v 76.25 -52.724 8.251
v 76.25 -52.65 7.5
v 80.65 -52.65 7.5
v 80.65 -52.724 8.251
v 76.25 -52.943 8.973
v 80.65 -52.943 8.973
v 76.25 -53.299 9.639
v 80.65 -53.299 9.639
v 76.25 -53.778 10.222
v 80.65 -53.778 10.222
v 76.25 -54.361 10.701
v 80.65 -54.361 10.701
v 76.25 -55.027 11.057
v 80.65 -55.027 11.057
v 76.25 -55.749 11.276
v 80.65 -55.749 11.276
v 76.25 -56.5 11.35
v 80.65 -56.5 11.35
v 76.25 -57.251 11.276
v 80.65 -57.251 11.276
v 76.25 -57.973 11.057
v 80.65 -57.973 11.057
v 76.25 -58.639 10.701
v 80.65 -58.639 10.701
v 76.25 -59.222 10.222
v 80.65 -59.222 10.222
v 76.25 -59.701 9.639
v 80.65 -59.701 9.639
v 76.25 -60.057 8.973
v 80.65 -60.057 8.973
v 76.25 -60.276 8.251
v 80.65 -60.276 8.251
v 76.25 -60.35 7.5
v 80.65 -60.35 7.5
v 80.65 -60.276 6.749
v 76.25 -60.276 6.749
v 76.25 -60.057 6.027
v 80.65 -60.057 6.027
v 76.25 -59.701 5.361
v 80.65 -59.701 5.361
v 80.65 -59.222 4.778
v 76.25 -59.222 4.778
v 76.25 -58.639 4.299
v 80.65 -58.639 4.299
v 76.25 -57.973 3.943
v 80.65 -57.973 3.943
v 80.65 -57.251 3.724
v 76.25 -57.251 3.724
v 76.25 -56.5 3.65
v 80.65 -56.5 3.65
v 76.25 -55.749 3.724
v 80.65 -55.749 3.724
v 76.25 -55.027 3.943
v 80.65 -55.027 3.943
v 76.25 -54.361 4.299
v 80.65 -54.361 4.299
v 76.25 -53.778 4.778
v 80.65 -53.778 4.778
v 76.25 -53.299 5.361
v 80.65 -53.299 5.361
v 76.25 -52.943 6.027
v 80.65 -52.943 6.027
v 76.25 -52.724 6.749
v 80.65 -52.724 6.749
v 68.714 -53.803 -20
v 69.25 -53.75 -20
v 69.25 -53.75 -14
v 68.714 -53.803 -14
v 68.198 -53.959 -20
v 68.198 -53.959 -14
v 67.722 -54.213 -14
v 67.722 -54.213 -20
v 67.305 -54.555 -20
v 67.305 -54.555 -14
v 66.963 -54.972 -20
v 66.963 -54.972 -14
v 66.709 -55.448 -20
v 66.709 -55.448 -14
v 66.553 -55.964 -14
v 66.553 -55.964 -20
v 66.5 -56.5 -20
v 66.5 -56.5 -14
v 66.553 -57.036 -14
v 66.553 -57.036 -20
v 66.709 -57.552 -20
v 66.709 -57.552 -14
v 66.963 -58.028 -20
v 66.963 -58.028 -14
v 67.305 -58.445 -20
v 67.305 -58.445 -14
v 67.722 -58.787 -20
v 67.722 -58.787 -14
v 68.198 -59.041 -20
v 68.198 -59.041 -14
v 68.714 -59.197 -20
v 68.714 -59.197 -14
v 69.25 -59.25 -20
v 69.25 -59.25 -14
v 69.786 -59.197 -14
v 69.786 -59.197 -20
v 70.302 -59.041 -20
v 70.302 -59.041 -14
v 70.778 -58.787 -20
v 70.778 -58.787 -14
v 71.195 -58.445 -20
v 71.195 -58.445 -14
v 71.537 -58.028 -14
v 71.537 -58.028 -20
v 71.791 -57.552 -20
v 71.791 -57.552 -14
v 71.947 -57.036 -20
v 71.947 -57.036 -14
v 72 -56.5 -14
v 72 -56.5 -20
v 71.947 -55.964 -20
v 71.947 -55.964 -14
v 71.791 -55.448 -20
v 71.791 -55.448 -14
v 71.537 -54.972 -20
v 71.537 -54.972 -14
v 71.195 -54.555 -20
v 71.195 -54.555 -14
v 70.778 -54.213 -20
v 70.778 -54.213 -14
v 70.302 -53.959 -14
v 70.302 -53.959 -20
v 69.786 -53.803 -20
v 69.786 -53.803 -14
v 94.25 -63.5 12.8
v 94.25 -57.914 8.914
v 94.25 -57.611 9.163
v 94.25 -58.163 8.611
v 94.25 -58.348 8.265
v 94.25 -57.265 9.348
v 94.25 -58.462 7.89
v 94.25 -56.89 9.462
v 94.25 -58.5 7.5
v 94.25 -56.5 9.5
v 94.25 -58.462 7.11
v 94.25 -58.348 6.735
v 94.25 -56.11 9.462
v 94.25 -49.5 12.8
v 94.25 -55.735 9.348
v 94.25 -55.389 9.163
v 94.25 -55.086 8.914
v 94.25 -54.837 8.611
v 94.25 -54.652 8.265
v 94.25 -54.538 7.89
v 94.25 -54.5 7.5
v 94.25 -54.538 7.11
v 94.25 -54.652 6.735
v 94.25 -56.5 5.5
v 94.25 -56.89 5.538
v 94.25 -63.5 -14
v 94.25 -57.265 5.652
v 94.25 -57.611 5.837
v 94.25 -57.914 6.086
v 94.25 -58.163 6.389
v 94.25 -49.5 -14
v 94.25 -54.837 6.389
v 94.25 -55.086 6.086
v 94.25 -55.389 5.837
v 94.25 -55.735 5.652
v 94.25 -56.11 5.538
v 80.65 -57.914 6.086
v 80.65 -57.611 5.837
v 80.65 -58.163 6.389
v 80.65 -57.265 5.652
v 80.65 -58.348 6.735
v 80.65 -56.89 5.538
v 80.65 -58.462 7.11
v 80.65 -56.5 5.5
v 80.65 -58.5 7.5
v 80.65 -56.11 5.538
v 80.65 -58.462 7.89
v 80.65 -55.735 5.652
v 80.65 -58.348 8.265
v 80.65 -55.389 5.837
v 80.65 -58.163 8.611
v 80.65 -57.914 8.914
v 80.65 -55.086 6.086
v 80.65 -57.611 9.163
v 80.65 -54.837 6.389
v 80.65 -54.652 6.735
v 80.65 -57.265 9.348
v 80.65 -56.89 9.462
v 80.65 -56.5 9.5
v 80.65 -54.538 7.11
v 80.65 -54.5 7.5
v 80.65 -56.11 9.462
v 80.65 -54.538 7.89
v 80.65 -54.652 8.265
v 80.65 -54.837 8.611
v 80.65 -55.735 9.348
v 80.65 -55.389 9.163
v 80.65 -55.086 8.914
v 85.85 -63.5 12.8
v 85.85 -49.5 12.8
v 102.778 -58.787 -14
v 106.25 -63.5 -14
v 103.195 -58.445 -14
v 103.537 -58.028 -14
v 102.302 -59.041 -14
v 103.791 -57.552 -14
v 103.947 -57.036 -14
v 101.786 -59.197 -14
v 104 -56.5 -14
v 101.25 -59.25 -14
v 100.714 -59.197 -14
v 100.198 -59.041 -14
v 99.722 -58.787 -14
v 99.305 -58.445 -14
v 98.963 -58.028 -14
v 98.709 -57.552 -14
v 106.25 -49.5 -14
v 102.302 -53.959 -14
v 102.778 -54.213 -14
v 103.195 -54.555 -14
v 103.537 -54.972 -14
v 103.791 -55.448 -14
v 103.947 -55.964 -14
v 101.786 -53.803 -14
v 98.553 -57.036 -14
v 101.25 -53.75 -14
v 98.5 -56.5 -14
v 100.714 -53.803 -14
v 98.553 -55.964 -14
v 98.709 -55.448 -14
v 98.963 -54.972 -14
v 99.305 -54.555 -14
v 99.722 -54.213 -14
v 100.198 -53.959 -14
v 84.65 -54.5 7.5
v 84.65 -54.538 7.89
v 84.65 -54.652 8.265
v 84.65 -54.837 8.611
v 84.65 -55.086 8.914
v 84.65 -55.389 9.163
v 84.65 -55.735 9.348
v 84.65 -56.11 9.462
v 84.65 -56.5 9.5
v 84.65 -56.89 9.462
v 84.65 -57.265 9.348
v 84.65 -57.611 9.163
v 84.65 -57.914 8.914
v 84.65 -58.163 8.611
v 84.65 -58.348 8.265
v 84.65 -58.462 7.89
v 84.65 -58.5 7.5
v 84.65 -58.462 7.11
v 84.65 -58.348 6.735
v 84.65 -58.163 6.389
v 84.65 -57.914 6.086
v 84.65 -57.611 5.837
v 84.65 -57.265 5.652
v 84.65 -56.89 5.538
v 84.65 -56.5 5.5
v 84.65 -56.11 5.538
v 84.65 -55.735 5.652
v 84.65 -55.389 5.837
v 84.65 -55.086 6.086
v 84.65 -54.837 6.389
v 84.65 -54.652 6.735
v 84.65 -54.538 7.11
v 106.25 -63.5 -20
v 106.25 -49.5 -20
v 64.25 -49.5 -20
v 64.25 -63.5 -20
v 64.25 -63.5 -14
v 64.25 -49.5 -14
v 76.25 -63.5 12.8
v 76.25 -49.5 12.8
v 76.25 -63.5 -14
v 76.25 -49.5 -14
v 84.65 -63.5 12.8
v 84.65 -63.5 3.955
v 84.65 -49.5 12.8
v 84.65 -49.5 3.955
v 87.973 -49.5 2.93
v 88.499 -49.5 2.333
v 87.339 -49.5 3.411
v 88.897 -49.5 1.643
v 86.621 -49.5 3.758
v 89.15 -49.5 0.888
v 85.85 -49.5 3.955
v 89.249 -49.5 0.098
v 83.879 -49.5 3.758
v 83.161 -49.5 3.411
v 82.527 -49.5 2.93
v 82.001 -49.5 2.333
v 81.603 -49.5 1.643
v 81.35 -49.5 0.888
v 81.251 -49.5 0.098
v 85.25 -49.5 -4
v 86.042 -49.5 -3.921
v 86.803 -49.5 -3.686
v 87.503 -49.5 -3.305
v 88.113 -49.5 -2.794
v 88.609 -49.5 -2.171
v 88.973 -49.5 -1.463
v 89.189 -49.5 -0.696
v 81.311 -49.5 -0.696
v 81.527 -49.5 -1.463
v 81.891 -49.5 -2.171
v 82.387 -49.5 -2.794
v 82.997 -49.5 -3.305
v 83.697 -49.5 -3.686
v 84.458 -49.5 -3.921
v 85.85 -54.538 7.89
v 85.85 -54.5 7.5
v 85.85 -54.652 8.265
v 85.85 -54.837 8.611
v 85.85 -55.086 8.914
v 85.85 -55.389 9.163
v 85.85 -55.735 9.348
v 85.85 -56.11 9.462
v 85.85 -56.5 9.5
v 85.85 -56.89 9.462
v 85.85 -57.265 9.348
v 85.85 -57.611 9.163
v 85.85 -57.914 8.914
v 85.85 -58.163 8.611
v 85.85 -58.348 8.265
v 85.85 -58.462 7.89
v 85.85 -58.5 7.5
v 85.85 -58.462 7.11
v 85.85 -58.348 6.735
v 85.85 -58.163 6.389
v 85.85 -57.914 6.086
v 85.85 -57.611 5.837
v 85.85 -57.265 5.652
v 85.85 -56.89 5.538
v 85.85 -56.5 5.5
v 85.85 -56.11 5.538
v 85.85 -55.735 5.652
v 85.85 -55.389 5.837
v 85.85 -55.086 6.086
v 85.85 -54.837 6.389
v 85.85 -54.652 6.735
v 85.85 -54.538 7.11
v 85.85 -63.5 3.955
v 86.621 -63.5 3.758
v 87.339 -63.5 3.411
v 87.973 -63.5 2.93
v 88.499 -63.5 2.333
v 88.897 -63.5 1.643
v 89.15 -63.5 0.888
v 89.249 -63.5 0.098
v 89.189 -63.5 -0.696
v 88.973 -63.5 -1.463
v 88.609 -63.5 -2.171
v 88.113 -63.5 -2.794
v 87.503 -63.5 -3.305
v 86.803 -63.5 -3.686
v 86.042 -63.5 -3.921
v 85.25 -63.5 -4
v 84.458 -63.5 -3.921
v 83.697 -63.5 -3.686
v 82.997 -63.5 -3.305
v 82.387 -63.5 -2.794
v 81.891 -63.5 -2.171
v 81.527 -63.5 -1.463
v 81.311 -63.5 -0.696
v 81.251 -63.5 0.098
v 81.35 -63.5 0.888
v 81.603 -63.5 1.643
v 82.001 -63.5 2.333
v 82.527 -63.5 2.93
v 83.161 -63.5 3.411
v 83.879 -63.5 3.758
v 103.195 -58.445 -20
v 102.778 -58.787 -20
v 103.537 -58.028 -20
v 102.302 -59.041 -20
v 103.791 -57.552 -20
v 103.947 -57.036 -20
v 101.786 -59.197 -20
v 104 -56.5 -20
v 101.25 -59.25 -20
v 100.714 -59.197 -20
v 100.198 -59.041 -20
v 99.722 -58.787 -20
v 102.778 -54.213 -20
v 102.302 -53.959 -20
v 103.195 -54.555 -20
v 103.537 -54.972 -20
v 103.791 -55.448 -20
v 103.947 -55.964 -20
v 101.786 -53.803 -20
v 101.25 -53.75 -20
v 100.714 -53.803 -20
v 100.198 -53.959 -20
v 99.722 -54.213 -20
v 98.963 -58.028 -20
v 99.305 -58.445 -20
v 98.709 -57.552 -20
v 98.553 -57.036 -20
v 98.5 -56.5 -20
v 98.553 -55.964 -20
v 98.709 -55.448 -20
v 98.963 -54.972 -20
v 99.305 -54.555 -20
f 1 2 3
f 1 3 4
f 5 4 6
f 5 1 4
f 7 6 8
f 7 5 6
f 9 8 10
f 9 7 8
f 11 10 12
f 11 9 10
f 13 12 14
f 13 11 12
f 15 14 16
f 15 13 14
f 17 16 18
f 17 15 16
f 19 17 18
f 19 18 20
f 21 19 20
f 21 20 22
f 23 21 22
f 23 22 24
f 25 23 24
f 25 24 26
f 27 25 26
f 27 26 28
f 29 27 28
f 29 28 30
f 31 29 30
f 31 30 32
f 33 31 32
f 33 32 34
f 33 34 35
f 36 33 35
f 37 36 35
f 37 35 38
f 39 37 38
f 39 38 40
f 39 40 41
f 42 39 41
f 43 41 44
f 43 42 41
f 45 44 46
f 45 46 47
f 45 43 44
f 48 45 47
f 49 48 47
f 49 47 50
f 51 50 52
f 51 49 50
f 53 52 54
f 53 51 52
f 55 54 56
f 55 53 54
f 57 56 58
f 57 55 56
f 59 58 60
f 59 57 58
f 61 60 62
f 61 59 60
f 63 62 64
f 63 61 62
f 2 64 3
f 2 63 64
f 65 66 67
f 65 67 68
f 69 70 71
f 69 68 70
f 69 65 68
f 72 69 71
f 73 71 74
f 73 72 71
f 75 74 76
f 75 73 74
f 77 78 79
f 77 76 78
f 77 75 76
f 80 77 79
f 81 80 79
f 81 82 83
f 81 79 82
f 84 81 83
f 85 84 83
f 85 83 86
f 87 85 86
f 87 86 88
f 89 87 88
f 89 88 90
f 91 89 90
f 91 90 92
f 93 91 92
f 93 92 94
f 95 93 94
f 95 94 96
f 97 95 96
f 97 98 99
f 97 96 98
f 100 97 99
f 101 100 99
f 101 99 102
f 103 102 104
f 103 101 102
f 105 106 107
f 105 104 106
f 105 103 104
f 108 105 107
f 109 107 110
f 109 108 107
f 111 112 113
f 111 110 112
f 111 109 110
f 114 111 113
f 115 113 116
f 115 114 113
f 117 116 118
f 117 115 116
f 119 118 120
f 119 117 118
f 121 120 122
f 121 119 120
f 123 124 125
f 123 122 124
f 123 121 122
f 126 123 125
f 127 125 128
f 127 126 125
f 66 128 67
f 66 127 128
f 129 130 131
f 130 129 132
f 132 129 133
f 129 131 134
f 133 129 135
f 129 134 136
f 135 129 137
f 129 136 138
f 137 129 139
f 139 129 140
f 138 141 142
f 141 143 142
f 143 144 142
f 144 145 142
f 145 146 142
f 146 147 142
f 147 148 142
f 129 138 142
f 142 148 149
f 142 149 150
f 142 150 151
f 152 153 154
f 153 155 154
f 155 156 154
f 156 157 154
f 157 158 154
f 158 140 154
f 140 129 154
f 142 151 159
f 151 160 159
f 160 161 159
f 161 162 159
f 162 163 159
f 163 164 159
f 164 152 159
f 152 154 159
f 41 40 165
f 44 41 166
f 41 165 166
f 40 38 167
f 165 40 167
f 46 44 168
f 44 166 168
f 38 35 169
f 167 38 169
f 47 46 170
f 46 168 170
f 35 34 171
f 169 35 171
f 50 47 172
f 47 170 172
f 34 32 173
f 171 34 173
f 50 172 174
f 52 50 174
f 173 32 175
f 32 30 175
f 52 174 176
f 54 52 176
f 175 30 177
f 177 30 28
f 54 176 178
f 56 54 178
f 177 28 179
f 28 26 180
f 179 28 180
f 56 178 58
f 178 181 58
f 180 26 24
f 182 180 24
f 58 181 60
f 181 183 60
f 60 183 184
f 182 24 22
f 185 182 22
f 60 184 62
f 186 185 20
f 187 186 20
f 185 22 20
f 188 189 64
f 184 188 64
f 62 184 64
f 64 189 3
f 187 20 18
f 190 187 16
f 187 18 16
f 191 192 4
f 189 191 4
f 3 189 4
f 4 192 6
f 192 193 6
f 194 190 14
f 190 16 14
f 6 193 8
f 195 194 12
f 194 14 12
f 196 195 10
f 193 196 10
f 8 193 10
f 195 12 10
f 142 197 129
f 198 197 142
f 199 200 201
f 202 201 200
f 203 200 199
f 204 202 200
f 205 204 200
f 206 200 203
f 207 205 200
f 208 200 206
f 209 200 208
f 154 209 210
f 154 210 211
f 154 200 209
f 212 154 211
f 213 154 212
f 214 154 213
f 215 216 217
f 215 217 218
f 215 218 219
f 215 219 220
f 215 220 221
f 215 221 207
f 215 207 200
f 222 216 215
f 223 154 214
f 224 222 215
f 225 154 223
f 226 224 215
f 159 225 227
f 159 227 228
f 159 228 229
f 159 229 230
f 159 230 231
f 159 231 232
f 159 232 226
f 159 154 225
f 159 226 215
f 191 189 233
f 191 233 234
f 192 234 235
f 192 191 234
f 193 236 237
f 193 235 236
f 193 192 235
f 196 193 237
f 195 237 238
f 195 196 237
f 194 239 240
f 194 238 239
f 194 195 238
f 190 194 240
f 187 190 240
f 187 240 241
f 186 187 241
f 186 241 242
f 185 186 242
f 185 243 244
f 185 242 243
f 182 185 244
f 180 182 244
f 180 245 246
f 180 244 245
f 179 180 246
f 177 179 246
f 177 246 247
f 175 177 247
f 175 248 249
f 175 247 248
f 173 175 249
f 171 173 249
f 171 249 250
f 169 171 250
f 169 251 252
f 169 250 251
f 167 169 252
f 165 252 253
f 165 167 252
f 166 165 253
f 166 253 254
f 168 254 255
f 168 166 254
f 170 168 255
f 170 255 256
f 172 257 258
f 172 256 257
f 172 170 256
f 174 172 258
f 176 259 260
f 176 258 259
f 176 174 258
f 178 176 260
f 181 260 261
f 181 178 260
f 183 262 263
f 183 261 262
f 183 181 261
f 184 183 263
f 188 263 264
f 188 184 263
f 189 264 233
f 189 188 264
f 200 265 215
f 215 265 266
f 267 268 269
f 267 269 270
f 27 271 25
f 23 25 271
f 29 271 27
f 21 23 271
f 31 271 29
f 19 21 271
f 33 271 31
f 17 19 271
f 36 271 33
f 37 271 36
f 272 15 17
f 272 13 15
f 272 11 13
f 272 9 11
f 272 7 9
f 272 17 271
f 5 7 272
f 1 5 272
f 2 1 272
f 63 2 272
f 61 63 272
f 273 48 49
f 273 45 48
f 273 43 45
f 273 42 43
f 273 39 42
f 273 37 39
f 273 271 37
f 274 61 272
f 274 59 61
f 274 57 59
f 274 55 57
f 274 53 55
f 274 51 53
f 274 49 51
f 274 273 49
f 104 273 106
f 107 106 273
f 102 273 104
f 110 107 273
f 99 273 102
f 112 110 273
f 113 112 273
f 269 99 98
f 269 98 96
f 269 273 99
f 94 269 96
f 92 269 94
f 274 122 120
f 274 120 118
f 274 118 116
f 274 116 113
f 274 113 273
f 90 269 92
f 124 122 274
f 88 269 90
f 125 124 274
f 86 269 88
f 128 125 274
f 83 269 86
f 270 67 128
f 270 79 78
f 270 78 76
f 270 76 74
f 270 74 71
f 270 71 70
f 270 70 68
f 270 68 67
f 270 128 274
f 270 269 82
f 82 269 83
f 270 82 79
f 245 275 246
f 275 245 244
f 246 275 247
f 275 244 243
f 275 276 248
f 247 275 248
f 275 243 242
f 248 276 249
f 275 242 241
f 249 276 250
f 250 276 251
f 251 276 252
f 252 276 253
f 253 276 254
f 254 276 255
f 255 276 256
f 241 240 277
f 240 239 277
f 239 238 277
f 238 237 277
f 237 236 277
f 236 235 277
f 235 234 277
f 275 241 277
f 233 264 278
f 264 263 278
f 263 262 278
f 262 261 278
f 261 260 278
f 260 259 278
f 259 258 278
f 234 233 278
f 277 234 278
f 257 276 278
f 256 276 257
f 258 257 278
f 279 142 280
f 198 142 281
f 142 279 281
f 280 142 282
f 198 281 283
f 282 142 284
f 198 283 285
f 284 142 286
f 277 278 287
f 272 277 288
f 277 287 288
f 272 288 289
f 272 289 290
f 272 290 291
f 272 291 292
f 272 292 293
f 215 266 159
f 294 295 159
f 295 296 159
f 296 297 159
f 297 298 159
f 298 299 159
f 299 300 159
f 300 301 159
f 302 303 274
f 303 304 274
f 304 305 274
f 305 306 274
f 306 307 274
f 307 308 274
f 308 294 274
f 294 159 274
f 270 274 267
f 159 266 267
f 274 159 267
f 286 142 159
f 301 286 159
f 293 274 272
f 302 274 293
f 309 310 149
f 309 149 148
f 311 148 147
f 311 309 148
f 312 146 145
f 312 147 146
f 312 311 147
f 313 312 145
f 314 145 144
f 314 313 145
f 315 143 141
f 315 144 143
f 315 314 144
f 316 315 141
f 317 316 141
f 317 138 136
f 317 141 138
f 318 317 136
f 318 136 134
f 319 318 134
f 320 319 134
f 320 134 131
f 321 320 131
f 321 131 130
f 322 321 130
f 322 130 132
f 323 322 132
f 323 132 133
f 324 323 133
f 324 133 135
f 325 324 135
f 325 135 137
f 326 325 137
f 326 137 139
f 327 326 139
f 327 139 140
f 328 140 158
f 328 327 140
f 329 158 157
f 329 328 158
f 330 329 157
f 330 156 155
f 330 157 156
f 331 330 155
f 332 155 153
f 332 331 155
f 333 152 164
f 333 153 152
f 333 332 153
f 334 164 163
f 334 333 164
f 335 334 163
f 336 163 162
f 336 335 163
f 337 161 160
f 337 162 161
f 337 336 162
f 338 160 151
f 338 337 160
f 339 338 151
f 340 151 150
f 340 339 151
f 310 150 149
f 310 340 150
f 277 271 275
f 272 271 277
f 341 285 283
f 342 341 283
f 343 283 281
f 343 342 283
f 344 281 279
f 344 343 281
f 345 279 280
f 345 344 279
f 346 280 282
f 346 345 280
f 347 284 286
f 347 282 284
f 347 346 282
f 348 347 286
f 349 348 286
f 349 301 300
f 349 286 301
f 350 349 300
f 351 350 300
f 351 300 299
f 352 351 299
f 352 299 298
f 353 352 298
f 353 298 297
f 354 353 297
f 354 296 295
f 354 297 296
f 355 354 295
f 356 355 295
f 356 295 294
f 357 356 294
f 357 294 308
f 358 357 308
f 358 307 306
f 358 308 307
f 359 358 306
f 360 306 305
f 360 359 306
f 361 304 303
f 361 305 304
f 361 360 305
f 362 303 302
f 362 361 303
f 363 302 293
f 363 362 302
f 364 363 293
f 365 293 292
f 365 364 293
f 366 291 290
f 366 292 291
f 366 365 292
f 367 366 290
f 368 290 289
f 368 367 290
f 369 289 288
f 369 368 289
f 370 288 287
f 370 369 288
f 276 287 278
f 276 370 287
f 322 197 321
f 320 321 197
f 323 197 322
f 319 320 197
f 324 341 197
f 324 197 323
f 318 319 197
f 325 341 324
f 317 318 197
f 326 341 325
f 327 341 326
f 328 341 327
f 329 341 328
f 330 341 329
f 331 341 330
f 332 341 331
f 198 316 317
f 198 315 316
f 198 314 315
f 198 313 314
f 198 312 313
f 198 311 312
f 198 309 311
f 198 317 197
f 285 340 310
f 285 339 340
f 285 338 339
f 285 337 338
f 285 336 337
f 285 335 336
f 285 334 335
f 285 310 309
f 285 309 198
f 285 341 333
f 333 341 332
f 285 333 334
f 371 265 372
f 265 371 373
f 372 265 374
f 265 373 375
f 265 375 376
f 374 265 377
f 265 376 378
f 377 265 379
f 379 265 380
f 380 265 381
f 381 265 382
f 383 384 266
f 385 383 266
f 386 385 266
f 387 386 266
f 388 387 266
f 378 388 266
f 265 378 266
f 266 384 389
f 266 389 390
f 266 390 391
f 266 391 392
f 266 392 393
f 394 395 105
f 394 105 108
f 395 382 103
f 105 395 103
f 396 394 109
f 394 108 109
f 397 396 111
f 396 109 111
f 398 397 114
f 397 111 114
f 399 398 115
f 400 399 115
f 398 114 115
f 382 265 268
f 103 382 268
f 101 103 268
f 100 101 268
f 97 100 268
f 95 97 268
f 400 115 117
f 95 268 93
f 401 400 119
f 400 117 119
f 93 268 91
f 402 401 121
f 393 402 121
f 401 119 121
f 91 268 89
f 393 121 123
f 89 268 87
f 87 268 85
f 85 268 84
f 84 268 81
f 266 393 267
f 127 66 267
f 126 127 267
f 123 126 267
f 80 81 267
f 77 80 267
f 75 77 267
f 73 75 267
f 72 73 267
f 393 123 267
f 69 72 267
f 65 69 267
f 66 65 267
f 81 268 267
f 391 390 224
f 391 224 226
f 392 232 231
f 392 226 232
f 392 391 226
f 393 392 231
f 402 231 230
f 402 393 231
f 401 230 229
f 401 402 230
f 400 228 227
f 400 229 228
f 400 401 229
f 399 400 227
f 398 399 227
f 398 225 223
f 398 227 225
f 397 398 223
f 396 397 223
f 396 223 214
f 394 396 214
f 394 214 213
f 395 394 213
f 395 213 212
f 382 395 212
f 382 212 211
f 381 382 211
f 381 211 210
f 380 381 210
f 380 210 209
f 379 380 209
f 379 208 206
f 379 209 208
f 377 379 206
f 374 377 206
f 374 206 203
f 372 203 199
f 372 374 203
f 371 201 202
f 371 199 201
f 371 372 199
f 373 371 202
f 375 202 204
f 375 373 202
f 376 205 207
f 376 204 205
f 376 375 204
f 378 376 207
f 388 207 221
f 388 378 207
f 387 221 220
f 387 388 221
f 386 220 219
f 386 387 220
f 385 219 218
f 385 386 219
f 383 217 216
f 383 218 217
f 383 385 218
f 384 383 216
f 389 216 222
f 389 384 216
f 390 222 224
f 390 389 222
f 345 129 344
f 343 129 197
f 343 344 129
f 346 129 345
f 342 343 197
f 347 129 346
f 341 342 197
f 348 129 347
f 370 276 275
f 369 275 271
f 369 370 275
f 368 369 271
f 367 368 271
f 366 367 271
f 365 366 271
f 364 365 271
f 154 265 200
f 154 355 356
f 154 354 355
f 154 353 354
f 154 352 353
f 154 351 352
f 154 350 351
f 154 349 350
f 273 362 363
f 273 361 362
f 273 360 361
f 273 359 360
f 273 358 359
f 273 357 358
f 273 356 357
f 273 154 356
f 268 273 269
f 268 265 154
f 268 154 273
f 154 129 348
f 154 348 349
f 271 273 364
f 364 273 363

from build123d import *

# Parameters (mm, degrees)
MBOLT_SH_L_R                     = 2.75
MBOLT_SH_L_DEPTH                 = 8
MBOLT_SH_R_R                     = 2.75
MBOLT_SH_R_DEPTH                 = 8
MBOLTS_SH_PLACEMENT_ANGLE        = 90
TBOLT_SHAFT_R                    = 2
TBOLT_SHAFT_DEPTH                = 20
TBOLT_SHAFT_ROLL_ANGLE           = 90
UP_SEP_W                         = 16
UP_SEP_H                         = 1.2
UP_SEP_DEPTH                     = 13.8
SHAFT_HOLE_R                     = 4
SHAFT_HOLE_DEPTH                 = 16
SHAFT_HOLE_PITCH_ANGLE           = 90
TBOLT_HEAD_R                     = 3.85
TBOLT_HEAD_DEPTH                 = 5.4
TBOLT_HEAD_ROLL_ANGLE            = 90
SIDE_BOX_L_W                     = 14
SIDE_BOX_L_H                     = 12
SIDE_BOX_L_DEPTH                 = 26.8
SIDE_BOX_R_W                     = 14
SIDE_BOX_R_H                     = 12
SIDE_BOX_R_DEPTH                 = 26.8
TOTAL_BOX_W                      = 14
TOTAL_BOX_H                      = 42
TOTAL_BOX_DEPTH                  = 32.8
SK_SHAPE_W_HOLES_PLACEMENT_ANGLE = 90


with BuildPart() as mbolt_sh_l:
    # mbolt_sh_l → mbolt_sh_l (new body)
    with BuildSketch(Plane(origin=(7, -16, -1), x_dir=(1, 0, 0), z_dir=(0, 0, 1))):
        Circle(MBOLT_SH_L_R)
    extrude(amount=MBOLT_SH_L_DEPTH)


with BuildPart() as mbolts_sh:
    # mbolt_sh_r → mbolt_sh_r (new body)
    with BuildSketch(Plane(origin=(7, 16, -1), x_dir=(1, 0, 0), z_dir=(0, 0, 1))):
        Circle(MBOLT_SH_R_R)
    extrude(amount=MBOLT_SH_R_DEPTH)

    # mbolts_sh: union mbolt_sh_l
    add(mbolt_sh_l.part)


with BuildPart() as mbolts_sh_1:
    # mbolts_sh placement: moved
    add(mbolts_sh.part.moved(Location((0, -7, 0))).rotate(Axis((0, -7, 0), (0, 0, 1)), MBOLTS_SH_PLACEMENT_ANGLE))


with BuildPart() as tbolt_shaft:
    # tbolt_shaft → tbolt_shaft (new body)
    with BuildSketch(Plane.XY):
        Circle(TBOLT_SHAFT_R)
    extrude(amount=TBOLT_SHAFT_DEPTH)


with BuildPart() as tbolt_shaft_1:
    # tbolt_shaft roll: moved
    add(tbolt_shaft.part.rotate(Axis((0, 0, 0), (1, 0, 0)), TBOLT_SHAFT_ROLL_ANGLE))


with BuildPart() as tbolt_shaft_2:
    # tbolt_shaft placement: moved
    add(tbolt_shaft_1.part.moved(Location((7, 10, 27.5))))


with BuildPart() as up_sep:
    # up_sep → up_sep (new body)
    with BuildSketch(Plane(origin=(-1, -0.6, 21), x_dir=(1, 0, 0), z_dir=(0, 0, 1))):
        with Locations((8, 0.6)):
            Rectangle(UP_SEP_W, UP_SEP_H)
    extrude(amount=UP_SEP_DEPTH)


with BuildPart() as shaft_hole:
    # shaft_hole → shaft_hole (new body)
    with BuildSketch(Plane.XY):
        Circle(SHAFT_HOLE_R)
    extrude(amount=SHAFT_HOLE_DEPTH)


with BuildPart() as shaft_hole_1:
    # shaft_hole pitch: moved
    add(shaft_hole.part.rotate(Axis((0, 0, 0), (0, 1, 0)), SHAFT_HOLE_PITCH_ANGLE))


with BuildPart() as shaft_hole_2:
    # shaft_hole placement: moved
    add(shaft_hole_1.part.moved(Location((-1, 0, 20))))


with BuildPart() as fuse_shaft_holes:
    # tbolt_head → tbolt_head (new body)
    with BuildSketch(Plane.XY):
        Circle(TBOLT_HEAD_R)
    extrude(amount=TBOLT_HEAD_DEPTH)


with BuildPart() as fuse_shaft_holes_1:
    # tbolt_head roll: moved
    add(fuse_shaft_holes.part.rotate(Axis((0, 0, 0), (1, 0, 0)), TBOLT_HEAD_ROLL_ANGLE))


with BuildPart() as fuse_shaft_holes_2:
    # tbolt_head placement: moved
    add(fuse_shaft_holes_1.part.moved(Location((7, 10, 27.5))))

    # fuse_shaft_holes: union tbolt_shaft, up_sep, shaft_hole
    add(tbolt_shaft_2.part)
    add(up_sep.part)
    add(shaft_hole_2.part)


with BuildPart() as side_box_l:
    # side_box_l → side_box_l (new body)
    with BuildSketch(Plane(origin=(0, -21, 6), x_dir=(1, 0, 0), z_dir=(0, 0, 1))):
        with Locations((7, 6)):
            Rectangle(SIDE_BOX_L_W, SIDE_BOX_L_H)
    extrude(amount=SIDE_BOX_L_DEPTH)


with BuildPart() as side_boxes:
    # side_box_r → side_box_r (new body)
    with BuildSketch(Plane(origin=(0, 9, 6), x_dir=(1, 0, 0), z_dir=(0, 0, 1))):
        with Locations((7, 6)):
            Rectangle(SIDE_BOX_R_W, SIDE_BOX_R_H)
    extrude(amount=SIDE_BOX_R_DEPTH)

    # side_boxes: union side_box_l
    add(side_box_l.part)


with BuildPart() as sky_x_y0:
    # total_box → total_box (new body)
    with BuildSketch(Plane(origin=(0, -21, 0), x_dir=(1, 0, 0), z_dir=(0, 0, 1))):
        with Locations((7, 21)):
            Rectangle(TOTAL_BOX_W, TOTAL_BOX_H)
    extrude(amount=TOTAL_BOX_DEPTH)

    # sk_shape: cut side_boxes
    add(side_boxes.part, mode=Mode.SUBTRACT)

    # sk_shape_w_holes: cut fuse_shaft_holes
    add(fuse_shaft_holes_2.part, mode=Mode.SUBTRACT)


with BuildPart() as sky_x_y0_1:
    # sk_shape_w_holes placement: moved
    add(sky_x_y0.part.moved(Location((0, -7, 0))).rotate(Axis((0, -7, 0), (0, 0, 1)), SK_SHAPE_W_HOLES_PLACEMENT_ANGLE))

    # sky_x_y0: cut mbolts_sh
    add(mbolts_sh_1.part, mode=Mode.SUBTRACT)


with BuildPart() as sky_x_y0_2:
    # sky_x_y0 placement: moved
    add(sky_x_y0_1.part.moved(Location((85.25, -56.5, -20))))


solid = sky_x_y0_2.part
